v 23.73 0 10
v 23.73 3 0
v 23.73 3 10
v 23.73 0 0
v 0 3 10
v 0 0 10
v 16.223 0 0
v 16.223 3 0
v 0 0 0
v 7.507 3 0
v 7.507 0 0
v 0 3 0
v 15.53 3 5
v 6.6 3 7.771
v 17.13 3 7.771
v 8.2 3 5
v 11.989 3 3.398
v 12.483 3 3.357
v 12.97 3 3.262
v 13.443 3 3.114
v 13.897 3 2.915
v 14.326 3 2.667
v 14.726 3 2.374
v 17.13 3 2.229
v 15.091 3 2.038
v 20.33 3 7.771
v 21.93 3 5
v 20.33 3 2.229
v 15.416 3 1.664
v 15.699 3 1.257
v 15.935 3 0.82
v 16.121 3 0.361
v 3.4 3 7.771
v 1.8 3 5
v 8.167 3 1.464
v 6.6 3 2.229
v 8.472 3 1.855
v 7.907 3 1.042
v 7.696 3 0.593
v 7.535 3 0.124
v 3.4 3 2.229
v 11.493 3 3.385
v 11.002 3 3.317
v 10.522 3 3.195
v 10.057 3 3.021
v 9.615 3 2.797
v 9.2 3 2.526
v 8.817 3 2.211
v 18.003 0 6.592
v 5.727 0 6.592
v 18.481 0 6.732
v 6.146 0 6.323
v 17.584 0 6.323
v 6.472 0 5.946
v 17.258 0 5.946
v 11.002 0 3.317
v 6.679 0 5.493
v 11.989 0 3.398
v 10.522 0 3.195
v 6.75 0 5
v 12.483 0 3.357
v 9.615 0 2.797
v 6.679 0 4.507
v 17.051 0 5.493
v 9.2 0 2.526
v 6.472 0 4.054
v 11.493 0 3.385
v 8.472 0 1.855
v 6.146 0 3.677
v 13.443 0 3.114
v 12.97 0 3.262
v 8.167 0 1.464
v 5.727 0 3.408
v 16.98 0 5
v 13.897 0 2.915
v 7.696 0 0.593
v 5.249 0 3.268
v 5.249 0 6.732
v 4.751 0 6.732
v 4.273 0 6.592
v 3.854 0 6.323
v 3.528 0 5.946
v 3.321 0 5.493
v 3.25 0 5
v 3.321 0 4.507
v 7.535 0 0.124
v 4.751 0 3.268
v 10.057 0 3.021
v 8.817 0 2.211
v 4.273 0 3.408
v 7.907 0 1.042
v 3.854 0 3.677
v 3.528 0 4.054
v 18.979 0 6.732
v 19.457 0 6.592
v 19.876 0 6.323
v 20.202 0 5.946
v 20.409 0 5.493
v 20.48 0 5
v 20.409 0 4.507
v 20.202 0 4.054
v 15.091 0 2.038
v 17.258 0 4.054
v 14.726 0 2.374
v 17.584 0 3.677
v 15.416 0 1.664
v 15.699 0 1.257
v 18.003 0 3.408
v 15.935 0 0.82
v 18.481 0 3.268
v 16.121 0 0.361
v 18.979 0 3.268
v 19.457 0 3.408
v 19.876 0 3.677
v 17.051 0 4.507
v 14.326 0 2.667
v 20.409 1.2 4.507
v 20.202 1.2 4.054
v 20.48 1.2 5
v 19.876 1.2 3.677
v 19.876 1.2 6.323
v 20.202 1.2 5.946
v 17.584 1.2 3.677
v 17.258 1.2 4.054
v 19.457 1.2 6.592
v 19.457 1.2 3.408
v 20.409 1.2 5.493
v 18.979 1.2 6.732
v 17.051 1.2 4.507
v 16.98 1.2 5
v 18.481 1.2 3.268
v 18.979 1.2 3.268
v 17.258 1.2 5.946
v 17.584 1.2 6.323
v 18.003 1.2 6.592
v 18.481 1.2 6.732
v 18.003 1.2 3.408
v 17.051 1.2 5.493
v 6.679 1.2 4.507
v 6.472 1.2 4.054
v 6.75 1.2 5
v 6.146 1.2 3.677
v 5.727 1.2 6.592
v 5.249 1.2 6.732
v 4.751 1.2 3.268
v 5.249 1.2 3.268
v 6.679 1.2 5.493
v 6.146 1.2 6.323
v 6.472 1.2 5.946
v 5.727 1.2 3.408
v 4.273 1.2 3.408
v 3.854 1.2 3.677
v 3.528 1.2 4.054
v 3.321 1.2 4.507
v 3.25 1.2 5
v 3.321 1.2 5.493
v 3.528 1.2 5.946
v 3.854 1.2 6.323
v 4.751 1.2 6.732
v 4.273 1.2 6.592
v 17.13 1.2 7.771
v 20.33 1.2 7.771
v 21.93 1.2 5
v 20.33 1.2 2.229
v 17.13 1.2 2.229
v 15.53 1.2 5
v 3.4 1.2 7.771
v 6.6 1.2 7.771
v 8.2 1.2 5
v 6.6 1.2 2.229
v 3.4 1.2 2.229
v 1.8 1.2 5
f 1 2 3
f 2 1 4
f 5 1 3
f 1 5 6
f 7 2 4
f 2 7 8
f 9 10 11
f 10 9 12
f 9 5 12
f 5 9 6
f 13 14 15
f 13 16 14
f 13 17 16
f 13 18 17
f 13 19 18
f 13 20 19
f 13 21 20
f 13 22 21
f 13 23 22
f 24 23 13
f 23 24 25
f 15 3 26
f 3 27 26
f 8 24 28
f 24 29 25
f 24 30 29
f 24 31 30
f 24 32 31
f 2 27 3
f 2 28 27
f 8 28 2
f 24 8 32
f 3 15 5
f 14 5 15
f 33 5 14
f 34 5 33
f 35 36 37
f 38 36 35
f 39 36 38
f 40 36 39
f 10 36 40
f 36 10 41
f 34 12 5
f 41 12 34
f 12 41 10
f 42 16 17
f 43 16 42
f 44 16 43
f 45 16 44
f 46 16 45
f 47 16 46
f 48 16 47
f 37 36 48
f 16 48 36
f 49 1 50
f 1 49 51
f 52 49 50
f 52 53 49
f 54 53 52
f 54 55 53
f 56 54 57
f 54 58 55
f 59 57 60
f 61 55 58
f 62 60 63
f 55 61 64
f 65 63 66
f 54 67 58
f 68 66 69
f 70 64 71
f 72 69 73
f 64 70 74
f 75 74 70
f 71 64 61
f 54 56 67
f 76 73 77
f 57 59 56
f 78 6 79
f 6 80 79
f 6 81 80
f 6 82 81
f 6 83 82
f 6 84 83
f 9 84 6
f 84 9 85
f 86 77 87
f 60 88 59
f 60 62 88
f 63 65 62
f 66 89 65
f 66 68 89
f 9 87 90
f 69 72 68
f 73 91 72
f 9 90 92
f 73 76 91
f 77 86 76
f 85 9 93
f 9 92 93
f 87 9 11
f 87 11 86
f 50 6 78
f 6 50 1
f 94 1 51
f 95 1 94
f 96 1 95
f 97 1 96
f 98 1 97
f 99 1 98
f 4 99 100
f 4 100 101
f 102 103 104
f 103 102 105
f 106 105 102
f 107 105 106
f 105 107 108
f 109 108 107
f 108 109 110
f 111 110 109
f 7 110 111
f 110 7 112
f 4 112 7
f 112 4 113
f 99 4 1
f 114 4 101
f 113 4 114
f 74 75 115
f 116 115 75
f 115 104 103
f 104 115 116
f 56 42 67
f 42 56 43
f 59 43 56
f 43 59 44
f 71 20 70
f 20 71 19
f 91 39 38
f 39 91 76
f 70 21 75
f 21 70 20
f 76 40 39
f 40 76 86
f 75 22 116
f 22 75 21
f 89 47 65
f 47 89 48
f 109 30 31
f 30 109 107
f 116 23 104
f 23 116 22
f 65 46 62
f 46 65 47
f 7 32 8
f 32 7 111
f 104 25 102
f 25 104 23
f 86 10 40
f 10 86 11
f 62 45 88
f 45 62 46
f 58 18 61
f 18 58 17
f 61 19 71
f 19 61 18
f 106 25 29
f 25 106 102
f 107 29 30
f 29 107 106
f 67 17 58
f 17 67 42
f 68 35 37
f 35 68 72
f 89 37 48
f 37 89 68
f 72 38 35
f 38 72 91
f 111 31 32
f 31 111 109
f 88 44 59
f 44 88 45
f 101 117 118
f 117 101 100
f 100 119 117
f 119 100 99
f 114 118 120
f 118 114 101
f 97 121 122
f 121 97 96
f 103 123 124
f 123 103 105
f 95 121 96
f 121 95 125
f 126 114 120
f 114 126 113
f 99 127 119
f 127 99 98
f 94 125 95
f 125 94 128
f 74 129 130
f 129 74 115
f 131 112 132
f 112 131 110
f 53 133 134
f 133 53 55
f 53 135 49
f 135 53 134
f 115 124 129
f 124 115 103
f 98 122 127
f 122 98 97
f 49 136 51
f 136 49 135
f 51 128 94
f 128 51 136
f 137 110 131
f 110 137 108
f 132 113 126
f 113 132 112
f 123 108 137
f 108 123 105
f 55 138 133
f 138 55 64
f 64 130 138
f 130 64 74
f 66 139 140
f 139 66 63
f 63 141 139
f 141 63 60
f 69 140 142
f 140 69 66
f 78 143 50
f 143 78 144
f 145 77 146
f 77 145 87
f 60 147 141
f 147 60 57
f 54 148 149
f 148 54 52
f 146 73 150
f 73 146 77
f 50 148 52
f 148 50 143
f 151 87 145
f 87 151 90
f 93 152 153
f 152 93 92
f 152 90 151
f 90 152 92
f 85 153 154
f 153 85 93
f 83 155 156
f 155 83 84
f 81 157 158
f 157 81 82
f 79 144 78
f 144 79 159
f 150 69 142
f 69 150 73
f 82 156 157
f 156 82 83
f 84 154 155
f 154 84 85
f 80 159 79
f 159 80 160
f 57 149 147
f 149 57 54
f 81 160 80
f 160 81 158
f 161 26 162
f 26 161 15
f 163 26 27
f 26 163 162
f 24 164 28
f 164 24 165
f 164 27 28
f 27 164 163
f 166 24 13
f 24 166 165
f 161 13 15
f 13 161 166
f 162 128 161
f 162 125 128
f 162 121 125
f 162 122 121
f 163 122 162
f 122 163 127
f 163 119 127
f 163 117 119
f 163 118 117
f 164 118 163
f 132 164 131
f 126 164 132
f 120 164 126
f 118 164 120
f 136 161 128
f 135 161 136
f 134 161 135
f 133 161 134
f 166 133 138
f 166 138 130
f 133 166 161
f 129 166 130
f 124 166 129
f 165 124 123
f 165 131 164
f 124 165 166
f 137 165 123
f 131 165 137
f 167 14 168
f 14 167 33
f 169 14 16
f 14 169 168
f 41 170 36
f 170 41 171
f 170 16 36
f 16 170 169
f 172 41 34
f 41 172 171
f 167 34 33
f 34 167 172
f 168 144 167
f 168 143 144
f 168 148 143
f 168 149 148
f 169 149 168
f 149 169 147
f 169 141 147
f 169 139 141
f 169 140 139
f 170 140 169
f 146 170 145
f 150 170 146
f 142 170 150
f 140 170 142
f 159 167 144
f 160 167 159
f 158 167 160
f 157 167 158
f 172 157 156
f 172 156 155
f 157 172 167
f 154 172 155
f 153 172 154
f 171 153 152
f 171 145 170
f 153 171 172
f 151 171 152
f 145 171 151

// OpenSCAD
// Copyright 2018 Geoff Sobering - All Rights Reserved
//
// This design is licensed under the Creative Commons
//   Attribution-NonCommercial-ShareAlike 3.0 Unported License
//  (CC BY-NC-SA 3.0)
//  https://creativecommons.org/licenses/by-nc-sa/3.0/
//  https://creativecommons.org/licenses/by-nc-sa/3.0/legalcode
//
// For commerical use, please contact us (geoff@geoffs.net).

$fa=1;
$fs=0.5;

mtgScrewCtrs_x = 13.73;
mtgHoleToEdge = 14.3;
mtgScrewDia = 3.5;
mtgScrewHeadRecessDia = 6; // Extra-big M3 socket-head.

plateZcorrection = 0;

plate_x = mtgScrewCtrs_x + 10;
plate_y = 3;
plate_z = 10;
echo(str("plate_x = ", plate_x));
echo(str("plate_y (thickness) = ", plate_y));

mtgScrewCtr_x = plate_x/2;
mtgScrewCtr_z = plate_z/2;

screwClearanceHoleCtr_x = mtgScrewCtr_x;
screwClearanceHoleCtr_z = mtgScrewCtr_z - 6.1;
screwClearanceHoleDia = 9;

difference()
{
  plate();
  guideRodClearanceSlot();
  mtgScreHole(1);
  mtgScreHole(-1);
  mtgScrewHeadRecesss(1);
  mtgScrewHeadRecesss(-1);
}

module plate()
{
  cube([plate_x, plate_y, plate_z]);
}

module mtgScreHole(sgn)
{
  translate([mtgScrewCtr_x+sgn*(mtgScrewCtrs_x/2), 0, mtgScrewCtr_z]) rotate(-90, [1,0,0])
  {
    translate([0, 0, -100+10]) cylinder(d=mtgScrewDia, h=100);
  }
}

module mtgScrewHeadRecesss(sgn)
{
  translate([mtgScrewCtr_x+sgn*(mtgScrewCtrs_x/2), 1.2, mtgScrewCtr_z]) rotate(-90, [1,0,0]) M3_nutRecess(5);
}

module guideRodClearanceSlot()
{
  h = plate_y+2;
  translate([screwClearanceHoleCtr_x,-1, screwClearanceHoleCtr_z]) rotate(-90, [1,0,0]) cylinder(d=screwClearanceHoleDia, h=h);
  translate([screwClearanceHoleCtr_x-screwClearanceHoleDia/2, -1, -1]) cube([screwClearanceHoleDia, h, screwClearanceHoleCtr_z+1]);
}

module M3_nutRecess(h)
{
  M3_nutRecessDia = 6.4;
  cylinder(r=M3_nutRecessDia/2, h=h, $fn=6);
}
